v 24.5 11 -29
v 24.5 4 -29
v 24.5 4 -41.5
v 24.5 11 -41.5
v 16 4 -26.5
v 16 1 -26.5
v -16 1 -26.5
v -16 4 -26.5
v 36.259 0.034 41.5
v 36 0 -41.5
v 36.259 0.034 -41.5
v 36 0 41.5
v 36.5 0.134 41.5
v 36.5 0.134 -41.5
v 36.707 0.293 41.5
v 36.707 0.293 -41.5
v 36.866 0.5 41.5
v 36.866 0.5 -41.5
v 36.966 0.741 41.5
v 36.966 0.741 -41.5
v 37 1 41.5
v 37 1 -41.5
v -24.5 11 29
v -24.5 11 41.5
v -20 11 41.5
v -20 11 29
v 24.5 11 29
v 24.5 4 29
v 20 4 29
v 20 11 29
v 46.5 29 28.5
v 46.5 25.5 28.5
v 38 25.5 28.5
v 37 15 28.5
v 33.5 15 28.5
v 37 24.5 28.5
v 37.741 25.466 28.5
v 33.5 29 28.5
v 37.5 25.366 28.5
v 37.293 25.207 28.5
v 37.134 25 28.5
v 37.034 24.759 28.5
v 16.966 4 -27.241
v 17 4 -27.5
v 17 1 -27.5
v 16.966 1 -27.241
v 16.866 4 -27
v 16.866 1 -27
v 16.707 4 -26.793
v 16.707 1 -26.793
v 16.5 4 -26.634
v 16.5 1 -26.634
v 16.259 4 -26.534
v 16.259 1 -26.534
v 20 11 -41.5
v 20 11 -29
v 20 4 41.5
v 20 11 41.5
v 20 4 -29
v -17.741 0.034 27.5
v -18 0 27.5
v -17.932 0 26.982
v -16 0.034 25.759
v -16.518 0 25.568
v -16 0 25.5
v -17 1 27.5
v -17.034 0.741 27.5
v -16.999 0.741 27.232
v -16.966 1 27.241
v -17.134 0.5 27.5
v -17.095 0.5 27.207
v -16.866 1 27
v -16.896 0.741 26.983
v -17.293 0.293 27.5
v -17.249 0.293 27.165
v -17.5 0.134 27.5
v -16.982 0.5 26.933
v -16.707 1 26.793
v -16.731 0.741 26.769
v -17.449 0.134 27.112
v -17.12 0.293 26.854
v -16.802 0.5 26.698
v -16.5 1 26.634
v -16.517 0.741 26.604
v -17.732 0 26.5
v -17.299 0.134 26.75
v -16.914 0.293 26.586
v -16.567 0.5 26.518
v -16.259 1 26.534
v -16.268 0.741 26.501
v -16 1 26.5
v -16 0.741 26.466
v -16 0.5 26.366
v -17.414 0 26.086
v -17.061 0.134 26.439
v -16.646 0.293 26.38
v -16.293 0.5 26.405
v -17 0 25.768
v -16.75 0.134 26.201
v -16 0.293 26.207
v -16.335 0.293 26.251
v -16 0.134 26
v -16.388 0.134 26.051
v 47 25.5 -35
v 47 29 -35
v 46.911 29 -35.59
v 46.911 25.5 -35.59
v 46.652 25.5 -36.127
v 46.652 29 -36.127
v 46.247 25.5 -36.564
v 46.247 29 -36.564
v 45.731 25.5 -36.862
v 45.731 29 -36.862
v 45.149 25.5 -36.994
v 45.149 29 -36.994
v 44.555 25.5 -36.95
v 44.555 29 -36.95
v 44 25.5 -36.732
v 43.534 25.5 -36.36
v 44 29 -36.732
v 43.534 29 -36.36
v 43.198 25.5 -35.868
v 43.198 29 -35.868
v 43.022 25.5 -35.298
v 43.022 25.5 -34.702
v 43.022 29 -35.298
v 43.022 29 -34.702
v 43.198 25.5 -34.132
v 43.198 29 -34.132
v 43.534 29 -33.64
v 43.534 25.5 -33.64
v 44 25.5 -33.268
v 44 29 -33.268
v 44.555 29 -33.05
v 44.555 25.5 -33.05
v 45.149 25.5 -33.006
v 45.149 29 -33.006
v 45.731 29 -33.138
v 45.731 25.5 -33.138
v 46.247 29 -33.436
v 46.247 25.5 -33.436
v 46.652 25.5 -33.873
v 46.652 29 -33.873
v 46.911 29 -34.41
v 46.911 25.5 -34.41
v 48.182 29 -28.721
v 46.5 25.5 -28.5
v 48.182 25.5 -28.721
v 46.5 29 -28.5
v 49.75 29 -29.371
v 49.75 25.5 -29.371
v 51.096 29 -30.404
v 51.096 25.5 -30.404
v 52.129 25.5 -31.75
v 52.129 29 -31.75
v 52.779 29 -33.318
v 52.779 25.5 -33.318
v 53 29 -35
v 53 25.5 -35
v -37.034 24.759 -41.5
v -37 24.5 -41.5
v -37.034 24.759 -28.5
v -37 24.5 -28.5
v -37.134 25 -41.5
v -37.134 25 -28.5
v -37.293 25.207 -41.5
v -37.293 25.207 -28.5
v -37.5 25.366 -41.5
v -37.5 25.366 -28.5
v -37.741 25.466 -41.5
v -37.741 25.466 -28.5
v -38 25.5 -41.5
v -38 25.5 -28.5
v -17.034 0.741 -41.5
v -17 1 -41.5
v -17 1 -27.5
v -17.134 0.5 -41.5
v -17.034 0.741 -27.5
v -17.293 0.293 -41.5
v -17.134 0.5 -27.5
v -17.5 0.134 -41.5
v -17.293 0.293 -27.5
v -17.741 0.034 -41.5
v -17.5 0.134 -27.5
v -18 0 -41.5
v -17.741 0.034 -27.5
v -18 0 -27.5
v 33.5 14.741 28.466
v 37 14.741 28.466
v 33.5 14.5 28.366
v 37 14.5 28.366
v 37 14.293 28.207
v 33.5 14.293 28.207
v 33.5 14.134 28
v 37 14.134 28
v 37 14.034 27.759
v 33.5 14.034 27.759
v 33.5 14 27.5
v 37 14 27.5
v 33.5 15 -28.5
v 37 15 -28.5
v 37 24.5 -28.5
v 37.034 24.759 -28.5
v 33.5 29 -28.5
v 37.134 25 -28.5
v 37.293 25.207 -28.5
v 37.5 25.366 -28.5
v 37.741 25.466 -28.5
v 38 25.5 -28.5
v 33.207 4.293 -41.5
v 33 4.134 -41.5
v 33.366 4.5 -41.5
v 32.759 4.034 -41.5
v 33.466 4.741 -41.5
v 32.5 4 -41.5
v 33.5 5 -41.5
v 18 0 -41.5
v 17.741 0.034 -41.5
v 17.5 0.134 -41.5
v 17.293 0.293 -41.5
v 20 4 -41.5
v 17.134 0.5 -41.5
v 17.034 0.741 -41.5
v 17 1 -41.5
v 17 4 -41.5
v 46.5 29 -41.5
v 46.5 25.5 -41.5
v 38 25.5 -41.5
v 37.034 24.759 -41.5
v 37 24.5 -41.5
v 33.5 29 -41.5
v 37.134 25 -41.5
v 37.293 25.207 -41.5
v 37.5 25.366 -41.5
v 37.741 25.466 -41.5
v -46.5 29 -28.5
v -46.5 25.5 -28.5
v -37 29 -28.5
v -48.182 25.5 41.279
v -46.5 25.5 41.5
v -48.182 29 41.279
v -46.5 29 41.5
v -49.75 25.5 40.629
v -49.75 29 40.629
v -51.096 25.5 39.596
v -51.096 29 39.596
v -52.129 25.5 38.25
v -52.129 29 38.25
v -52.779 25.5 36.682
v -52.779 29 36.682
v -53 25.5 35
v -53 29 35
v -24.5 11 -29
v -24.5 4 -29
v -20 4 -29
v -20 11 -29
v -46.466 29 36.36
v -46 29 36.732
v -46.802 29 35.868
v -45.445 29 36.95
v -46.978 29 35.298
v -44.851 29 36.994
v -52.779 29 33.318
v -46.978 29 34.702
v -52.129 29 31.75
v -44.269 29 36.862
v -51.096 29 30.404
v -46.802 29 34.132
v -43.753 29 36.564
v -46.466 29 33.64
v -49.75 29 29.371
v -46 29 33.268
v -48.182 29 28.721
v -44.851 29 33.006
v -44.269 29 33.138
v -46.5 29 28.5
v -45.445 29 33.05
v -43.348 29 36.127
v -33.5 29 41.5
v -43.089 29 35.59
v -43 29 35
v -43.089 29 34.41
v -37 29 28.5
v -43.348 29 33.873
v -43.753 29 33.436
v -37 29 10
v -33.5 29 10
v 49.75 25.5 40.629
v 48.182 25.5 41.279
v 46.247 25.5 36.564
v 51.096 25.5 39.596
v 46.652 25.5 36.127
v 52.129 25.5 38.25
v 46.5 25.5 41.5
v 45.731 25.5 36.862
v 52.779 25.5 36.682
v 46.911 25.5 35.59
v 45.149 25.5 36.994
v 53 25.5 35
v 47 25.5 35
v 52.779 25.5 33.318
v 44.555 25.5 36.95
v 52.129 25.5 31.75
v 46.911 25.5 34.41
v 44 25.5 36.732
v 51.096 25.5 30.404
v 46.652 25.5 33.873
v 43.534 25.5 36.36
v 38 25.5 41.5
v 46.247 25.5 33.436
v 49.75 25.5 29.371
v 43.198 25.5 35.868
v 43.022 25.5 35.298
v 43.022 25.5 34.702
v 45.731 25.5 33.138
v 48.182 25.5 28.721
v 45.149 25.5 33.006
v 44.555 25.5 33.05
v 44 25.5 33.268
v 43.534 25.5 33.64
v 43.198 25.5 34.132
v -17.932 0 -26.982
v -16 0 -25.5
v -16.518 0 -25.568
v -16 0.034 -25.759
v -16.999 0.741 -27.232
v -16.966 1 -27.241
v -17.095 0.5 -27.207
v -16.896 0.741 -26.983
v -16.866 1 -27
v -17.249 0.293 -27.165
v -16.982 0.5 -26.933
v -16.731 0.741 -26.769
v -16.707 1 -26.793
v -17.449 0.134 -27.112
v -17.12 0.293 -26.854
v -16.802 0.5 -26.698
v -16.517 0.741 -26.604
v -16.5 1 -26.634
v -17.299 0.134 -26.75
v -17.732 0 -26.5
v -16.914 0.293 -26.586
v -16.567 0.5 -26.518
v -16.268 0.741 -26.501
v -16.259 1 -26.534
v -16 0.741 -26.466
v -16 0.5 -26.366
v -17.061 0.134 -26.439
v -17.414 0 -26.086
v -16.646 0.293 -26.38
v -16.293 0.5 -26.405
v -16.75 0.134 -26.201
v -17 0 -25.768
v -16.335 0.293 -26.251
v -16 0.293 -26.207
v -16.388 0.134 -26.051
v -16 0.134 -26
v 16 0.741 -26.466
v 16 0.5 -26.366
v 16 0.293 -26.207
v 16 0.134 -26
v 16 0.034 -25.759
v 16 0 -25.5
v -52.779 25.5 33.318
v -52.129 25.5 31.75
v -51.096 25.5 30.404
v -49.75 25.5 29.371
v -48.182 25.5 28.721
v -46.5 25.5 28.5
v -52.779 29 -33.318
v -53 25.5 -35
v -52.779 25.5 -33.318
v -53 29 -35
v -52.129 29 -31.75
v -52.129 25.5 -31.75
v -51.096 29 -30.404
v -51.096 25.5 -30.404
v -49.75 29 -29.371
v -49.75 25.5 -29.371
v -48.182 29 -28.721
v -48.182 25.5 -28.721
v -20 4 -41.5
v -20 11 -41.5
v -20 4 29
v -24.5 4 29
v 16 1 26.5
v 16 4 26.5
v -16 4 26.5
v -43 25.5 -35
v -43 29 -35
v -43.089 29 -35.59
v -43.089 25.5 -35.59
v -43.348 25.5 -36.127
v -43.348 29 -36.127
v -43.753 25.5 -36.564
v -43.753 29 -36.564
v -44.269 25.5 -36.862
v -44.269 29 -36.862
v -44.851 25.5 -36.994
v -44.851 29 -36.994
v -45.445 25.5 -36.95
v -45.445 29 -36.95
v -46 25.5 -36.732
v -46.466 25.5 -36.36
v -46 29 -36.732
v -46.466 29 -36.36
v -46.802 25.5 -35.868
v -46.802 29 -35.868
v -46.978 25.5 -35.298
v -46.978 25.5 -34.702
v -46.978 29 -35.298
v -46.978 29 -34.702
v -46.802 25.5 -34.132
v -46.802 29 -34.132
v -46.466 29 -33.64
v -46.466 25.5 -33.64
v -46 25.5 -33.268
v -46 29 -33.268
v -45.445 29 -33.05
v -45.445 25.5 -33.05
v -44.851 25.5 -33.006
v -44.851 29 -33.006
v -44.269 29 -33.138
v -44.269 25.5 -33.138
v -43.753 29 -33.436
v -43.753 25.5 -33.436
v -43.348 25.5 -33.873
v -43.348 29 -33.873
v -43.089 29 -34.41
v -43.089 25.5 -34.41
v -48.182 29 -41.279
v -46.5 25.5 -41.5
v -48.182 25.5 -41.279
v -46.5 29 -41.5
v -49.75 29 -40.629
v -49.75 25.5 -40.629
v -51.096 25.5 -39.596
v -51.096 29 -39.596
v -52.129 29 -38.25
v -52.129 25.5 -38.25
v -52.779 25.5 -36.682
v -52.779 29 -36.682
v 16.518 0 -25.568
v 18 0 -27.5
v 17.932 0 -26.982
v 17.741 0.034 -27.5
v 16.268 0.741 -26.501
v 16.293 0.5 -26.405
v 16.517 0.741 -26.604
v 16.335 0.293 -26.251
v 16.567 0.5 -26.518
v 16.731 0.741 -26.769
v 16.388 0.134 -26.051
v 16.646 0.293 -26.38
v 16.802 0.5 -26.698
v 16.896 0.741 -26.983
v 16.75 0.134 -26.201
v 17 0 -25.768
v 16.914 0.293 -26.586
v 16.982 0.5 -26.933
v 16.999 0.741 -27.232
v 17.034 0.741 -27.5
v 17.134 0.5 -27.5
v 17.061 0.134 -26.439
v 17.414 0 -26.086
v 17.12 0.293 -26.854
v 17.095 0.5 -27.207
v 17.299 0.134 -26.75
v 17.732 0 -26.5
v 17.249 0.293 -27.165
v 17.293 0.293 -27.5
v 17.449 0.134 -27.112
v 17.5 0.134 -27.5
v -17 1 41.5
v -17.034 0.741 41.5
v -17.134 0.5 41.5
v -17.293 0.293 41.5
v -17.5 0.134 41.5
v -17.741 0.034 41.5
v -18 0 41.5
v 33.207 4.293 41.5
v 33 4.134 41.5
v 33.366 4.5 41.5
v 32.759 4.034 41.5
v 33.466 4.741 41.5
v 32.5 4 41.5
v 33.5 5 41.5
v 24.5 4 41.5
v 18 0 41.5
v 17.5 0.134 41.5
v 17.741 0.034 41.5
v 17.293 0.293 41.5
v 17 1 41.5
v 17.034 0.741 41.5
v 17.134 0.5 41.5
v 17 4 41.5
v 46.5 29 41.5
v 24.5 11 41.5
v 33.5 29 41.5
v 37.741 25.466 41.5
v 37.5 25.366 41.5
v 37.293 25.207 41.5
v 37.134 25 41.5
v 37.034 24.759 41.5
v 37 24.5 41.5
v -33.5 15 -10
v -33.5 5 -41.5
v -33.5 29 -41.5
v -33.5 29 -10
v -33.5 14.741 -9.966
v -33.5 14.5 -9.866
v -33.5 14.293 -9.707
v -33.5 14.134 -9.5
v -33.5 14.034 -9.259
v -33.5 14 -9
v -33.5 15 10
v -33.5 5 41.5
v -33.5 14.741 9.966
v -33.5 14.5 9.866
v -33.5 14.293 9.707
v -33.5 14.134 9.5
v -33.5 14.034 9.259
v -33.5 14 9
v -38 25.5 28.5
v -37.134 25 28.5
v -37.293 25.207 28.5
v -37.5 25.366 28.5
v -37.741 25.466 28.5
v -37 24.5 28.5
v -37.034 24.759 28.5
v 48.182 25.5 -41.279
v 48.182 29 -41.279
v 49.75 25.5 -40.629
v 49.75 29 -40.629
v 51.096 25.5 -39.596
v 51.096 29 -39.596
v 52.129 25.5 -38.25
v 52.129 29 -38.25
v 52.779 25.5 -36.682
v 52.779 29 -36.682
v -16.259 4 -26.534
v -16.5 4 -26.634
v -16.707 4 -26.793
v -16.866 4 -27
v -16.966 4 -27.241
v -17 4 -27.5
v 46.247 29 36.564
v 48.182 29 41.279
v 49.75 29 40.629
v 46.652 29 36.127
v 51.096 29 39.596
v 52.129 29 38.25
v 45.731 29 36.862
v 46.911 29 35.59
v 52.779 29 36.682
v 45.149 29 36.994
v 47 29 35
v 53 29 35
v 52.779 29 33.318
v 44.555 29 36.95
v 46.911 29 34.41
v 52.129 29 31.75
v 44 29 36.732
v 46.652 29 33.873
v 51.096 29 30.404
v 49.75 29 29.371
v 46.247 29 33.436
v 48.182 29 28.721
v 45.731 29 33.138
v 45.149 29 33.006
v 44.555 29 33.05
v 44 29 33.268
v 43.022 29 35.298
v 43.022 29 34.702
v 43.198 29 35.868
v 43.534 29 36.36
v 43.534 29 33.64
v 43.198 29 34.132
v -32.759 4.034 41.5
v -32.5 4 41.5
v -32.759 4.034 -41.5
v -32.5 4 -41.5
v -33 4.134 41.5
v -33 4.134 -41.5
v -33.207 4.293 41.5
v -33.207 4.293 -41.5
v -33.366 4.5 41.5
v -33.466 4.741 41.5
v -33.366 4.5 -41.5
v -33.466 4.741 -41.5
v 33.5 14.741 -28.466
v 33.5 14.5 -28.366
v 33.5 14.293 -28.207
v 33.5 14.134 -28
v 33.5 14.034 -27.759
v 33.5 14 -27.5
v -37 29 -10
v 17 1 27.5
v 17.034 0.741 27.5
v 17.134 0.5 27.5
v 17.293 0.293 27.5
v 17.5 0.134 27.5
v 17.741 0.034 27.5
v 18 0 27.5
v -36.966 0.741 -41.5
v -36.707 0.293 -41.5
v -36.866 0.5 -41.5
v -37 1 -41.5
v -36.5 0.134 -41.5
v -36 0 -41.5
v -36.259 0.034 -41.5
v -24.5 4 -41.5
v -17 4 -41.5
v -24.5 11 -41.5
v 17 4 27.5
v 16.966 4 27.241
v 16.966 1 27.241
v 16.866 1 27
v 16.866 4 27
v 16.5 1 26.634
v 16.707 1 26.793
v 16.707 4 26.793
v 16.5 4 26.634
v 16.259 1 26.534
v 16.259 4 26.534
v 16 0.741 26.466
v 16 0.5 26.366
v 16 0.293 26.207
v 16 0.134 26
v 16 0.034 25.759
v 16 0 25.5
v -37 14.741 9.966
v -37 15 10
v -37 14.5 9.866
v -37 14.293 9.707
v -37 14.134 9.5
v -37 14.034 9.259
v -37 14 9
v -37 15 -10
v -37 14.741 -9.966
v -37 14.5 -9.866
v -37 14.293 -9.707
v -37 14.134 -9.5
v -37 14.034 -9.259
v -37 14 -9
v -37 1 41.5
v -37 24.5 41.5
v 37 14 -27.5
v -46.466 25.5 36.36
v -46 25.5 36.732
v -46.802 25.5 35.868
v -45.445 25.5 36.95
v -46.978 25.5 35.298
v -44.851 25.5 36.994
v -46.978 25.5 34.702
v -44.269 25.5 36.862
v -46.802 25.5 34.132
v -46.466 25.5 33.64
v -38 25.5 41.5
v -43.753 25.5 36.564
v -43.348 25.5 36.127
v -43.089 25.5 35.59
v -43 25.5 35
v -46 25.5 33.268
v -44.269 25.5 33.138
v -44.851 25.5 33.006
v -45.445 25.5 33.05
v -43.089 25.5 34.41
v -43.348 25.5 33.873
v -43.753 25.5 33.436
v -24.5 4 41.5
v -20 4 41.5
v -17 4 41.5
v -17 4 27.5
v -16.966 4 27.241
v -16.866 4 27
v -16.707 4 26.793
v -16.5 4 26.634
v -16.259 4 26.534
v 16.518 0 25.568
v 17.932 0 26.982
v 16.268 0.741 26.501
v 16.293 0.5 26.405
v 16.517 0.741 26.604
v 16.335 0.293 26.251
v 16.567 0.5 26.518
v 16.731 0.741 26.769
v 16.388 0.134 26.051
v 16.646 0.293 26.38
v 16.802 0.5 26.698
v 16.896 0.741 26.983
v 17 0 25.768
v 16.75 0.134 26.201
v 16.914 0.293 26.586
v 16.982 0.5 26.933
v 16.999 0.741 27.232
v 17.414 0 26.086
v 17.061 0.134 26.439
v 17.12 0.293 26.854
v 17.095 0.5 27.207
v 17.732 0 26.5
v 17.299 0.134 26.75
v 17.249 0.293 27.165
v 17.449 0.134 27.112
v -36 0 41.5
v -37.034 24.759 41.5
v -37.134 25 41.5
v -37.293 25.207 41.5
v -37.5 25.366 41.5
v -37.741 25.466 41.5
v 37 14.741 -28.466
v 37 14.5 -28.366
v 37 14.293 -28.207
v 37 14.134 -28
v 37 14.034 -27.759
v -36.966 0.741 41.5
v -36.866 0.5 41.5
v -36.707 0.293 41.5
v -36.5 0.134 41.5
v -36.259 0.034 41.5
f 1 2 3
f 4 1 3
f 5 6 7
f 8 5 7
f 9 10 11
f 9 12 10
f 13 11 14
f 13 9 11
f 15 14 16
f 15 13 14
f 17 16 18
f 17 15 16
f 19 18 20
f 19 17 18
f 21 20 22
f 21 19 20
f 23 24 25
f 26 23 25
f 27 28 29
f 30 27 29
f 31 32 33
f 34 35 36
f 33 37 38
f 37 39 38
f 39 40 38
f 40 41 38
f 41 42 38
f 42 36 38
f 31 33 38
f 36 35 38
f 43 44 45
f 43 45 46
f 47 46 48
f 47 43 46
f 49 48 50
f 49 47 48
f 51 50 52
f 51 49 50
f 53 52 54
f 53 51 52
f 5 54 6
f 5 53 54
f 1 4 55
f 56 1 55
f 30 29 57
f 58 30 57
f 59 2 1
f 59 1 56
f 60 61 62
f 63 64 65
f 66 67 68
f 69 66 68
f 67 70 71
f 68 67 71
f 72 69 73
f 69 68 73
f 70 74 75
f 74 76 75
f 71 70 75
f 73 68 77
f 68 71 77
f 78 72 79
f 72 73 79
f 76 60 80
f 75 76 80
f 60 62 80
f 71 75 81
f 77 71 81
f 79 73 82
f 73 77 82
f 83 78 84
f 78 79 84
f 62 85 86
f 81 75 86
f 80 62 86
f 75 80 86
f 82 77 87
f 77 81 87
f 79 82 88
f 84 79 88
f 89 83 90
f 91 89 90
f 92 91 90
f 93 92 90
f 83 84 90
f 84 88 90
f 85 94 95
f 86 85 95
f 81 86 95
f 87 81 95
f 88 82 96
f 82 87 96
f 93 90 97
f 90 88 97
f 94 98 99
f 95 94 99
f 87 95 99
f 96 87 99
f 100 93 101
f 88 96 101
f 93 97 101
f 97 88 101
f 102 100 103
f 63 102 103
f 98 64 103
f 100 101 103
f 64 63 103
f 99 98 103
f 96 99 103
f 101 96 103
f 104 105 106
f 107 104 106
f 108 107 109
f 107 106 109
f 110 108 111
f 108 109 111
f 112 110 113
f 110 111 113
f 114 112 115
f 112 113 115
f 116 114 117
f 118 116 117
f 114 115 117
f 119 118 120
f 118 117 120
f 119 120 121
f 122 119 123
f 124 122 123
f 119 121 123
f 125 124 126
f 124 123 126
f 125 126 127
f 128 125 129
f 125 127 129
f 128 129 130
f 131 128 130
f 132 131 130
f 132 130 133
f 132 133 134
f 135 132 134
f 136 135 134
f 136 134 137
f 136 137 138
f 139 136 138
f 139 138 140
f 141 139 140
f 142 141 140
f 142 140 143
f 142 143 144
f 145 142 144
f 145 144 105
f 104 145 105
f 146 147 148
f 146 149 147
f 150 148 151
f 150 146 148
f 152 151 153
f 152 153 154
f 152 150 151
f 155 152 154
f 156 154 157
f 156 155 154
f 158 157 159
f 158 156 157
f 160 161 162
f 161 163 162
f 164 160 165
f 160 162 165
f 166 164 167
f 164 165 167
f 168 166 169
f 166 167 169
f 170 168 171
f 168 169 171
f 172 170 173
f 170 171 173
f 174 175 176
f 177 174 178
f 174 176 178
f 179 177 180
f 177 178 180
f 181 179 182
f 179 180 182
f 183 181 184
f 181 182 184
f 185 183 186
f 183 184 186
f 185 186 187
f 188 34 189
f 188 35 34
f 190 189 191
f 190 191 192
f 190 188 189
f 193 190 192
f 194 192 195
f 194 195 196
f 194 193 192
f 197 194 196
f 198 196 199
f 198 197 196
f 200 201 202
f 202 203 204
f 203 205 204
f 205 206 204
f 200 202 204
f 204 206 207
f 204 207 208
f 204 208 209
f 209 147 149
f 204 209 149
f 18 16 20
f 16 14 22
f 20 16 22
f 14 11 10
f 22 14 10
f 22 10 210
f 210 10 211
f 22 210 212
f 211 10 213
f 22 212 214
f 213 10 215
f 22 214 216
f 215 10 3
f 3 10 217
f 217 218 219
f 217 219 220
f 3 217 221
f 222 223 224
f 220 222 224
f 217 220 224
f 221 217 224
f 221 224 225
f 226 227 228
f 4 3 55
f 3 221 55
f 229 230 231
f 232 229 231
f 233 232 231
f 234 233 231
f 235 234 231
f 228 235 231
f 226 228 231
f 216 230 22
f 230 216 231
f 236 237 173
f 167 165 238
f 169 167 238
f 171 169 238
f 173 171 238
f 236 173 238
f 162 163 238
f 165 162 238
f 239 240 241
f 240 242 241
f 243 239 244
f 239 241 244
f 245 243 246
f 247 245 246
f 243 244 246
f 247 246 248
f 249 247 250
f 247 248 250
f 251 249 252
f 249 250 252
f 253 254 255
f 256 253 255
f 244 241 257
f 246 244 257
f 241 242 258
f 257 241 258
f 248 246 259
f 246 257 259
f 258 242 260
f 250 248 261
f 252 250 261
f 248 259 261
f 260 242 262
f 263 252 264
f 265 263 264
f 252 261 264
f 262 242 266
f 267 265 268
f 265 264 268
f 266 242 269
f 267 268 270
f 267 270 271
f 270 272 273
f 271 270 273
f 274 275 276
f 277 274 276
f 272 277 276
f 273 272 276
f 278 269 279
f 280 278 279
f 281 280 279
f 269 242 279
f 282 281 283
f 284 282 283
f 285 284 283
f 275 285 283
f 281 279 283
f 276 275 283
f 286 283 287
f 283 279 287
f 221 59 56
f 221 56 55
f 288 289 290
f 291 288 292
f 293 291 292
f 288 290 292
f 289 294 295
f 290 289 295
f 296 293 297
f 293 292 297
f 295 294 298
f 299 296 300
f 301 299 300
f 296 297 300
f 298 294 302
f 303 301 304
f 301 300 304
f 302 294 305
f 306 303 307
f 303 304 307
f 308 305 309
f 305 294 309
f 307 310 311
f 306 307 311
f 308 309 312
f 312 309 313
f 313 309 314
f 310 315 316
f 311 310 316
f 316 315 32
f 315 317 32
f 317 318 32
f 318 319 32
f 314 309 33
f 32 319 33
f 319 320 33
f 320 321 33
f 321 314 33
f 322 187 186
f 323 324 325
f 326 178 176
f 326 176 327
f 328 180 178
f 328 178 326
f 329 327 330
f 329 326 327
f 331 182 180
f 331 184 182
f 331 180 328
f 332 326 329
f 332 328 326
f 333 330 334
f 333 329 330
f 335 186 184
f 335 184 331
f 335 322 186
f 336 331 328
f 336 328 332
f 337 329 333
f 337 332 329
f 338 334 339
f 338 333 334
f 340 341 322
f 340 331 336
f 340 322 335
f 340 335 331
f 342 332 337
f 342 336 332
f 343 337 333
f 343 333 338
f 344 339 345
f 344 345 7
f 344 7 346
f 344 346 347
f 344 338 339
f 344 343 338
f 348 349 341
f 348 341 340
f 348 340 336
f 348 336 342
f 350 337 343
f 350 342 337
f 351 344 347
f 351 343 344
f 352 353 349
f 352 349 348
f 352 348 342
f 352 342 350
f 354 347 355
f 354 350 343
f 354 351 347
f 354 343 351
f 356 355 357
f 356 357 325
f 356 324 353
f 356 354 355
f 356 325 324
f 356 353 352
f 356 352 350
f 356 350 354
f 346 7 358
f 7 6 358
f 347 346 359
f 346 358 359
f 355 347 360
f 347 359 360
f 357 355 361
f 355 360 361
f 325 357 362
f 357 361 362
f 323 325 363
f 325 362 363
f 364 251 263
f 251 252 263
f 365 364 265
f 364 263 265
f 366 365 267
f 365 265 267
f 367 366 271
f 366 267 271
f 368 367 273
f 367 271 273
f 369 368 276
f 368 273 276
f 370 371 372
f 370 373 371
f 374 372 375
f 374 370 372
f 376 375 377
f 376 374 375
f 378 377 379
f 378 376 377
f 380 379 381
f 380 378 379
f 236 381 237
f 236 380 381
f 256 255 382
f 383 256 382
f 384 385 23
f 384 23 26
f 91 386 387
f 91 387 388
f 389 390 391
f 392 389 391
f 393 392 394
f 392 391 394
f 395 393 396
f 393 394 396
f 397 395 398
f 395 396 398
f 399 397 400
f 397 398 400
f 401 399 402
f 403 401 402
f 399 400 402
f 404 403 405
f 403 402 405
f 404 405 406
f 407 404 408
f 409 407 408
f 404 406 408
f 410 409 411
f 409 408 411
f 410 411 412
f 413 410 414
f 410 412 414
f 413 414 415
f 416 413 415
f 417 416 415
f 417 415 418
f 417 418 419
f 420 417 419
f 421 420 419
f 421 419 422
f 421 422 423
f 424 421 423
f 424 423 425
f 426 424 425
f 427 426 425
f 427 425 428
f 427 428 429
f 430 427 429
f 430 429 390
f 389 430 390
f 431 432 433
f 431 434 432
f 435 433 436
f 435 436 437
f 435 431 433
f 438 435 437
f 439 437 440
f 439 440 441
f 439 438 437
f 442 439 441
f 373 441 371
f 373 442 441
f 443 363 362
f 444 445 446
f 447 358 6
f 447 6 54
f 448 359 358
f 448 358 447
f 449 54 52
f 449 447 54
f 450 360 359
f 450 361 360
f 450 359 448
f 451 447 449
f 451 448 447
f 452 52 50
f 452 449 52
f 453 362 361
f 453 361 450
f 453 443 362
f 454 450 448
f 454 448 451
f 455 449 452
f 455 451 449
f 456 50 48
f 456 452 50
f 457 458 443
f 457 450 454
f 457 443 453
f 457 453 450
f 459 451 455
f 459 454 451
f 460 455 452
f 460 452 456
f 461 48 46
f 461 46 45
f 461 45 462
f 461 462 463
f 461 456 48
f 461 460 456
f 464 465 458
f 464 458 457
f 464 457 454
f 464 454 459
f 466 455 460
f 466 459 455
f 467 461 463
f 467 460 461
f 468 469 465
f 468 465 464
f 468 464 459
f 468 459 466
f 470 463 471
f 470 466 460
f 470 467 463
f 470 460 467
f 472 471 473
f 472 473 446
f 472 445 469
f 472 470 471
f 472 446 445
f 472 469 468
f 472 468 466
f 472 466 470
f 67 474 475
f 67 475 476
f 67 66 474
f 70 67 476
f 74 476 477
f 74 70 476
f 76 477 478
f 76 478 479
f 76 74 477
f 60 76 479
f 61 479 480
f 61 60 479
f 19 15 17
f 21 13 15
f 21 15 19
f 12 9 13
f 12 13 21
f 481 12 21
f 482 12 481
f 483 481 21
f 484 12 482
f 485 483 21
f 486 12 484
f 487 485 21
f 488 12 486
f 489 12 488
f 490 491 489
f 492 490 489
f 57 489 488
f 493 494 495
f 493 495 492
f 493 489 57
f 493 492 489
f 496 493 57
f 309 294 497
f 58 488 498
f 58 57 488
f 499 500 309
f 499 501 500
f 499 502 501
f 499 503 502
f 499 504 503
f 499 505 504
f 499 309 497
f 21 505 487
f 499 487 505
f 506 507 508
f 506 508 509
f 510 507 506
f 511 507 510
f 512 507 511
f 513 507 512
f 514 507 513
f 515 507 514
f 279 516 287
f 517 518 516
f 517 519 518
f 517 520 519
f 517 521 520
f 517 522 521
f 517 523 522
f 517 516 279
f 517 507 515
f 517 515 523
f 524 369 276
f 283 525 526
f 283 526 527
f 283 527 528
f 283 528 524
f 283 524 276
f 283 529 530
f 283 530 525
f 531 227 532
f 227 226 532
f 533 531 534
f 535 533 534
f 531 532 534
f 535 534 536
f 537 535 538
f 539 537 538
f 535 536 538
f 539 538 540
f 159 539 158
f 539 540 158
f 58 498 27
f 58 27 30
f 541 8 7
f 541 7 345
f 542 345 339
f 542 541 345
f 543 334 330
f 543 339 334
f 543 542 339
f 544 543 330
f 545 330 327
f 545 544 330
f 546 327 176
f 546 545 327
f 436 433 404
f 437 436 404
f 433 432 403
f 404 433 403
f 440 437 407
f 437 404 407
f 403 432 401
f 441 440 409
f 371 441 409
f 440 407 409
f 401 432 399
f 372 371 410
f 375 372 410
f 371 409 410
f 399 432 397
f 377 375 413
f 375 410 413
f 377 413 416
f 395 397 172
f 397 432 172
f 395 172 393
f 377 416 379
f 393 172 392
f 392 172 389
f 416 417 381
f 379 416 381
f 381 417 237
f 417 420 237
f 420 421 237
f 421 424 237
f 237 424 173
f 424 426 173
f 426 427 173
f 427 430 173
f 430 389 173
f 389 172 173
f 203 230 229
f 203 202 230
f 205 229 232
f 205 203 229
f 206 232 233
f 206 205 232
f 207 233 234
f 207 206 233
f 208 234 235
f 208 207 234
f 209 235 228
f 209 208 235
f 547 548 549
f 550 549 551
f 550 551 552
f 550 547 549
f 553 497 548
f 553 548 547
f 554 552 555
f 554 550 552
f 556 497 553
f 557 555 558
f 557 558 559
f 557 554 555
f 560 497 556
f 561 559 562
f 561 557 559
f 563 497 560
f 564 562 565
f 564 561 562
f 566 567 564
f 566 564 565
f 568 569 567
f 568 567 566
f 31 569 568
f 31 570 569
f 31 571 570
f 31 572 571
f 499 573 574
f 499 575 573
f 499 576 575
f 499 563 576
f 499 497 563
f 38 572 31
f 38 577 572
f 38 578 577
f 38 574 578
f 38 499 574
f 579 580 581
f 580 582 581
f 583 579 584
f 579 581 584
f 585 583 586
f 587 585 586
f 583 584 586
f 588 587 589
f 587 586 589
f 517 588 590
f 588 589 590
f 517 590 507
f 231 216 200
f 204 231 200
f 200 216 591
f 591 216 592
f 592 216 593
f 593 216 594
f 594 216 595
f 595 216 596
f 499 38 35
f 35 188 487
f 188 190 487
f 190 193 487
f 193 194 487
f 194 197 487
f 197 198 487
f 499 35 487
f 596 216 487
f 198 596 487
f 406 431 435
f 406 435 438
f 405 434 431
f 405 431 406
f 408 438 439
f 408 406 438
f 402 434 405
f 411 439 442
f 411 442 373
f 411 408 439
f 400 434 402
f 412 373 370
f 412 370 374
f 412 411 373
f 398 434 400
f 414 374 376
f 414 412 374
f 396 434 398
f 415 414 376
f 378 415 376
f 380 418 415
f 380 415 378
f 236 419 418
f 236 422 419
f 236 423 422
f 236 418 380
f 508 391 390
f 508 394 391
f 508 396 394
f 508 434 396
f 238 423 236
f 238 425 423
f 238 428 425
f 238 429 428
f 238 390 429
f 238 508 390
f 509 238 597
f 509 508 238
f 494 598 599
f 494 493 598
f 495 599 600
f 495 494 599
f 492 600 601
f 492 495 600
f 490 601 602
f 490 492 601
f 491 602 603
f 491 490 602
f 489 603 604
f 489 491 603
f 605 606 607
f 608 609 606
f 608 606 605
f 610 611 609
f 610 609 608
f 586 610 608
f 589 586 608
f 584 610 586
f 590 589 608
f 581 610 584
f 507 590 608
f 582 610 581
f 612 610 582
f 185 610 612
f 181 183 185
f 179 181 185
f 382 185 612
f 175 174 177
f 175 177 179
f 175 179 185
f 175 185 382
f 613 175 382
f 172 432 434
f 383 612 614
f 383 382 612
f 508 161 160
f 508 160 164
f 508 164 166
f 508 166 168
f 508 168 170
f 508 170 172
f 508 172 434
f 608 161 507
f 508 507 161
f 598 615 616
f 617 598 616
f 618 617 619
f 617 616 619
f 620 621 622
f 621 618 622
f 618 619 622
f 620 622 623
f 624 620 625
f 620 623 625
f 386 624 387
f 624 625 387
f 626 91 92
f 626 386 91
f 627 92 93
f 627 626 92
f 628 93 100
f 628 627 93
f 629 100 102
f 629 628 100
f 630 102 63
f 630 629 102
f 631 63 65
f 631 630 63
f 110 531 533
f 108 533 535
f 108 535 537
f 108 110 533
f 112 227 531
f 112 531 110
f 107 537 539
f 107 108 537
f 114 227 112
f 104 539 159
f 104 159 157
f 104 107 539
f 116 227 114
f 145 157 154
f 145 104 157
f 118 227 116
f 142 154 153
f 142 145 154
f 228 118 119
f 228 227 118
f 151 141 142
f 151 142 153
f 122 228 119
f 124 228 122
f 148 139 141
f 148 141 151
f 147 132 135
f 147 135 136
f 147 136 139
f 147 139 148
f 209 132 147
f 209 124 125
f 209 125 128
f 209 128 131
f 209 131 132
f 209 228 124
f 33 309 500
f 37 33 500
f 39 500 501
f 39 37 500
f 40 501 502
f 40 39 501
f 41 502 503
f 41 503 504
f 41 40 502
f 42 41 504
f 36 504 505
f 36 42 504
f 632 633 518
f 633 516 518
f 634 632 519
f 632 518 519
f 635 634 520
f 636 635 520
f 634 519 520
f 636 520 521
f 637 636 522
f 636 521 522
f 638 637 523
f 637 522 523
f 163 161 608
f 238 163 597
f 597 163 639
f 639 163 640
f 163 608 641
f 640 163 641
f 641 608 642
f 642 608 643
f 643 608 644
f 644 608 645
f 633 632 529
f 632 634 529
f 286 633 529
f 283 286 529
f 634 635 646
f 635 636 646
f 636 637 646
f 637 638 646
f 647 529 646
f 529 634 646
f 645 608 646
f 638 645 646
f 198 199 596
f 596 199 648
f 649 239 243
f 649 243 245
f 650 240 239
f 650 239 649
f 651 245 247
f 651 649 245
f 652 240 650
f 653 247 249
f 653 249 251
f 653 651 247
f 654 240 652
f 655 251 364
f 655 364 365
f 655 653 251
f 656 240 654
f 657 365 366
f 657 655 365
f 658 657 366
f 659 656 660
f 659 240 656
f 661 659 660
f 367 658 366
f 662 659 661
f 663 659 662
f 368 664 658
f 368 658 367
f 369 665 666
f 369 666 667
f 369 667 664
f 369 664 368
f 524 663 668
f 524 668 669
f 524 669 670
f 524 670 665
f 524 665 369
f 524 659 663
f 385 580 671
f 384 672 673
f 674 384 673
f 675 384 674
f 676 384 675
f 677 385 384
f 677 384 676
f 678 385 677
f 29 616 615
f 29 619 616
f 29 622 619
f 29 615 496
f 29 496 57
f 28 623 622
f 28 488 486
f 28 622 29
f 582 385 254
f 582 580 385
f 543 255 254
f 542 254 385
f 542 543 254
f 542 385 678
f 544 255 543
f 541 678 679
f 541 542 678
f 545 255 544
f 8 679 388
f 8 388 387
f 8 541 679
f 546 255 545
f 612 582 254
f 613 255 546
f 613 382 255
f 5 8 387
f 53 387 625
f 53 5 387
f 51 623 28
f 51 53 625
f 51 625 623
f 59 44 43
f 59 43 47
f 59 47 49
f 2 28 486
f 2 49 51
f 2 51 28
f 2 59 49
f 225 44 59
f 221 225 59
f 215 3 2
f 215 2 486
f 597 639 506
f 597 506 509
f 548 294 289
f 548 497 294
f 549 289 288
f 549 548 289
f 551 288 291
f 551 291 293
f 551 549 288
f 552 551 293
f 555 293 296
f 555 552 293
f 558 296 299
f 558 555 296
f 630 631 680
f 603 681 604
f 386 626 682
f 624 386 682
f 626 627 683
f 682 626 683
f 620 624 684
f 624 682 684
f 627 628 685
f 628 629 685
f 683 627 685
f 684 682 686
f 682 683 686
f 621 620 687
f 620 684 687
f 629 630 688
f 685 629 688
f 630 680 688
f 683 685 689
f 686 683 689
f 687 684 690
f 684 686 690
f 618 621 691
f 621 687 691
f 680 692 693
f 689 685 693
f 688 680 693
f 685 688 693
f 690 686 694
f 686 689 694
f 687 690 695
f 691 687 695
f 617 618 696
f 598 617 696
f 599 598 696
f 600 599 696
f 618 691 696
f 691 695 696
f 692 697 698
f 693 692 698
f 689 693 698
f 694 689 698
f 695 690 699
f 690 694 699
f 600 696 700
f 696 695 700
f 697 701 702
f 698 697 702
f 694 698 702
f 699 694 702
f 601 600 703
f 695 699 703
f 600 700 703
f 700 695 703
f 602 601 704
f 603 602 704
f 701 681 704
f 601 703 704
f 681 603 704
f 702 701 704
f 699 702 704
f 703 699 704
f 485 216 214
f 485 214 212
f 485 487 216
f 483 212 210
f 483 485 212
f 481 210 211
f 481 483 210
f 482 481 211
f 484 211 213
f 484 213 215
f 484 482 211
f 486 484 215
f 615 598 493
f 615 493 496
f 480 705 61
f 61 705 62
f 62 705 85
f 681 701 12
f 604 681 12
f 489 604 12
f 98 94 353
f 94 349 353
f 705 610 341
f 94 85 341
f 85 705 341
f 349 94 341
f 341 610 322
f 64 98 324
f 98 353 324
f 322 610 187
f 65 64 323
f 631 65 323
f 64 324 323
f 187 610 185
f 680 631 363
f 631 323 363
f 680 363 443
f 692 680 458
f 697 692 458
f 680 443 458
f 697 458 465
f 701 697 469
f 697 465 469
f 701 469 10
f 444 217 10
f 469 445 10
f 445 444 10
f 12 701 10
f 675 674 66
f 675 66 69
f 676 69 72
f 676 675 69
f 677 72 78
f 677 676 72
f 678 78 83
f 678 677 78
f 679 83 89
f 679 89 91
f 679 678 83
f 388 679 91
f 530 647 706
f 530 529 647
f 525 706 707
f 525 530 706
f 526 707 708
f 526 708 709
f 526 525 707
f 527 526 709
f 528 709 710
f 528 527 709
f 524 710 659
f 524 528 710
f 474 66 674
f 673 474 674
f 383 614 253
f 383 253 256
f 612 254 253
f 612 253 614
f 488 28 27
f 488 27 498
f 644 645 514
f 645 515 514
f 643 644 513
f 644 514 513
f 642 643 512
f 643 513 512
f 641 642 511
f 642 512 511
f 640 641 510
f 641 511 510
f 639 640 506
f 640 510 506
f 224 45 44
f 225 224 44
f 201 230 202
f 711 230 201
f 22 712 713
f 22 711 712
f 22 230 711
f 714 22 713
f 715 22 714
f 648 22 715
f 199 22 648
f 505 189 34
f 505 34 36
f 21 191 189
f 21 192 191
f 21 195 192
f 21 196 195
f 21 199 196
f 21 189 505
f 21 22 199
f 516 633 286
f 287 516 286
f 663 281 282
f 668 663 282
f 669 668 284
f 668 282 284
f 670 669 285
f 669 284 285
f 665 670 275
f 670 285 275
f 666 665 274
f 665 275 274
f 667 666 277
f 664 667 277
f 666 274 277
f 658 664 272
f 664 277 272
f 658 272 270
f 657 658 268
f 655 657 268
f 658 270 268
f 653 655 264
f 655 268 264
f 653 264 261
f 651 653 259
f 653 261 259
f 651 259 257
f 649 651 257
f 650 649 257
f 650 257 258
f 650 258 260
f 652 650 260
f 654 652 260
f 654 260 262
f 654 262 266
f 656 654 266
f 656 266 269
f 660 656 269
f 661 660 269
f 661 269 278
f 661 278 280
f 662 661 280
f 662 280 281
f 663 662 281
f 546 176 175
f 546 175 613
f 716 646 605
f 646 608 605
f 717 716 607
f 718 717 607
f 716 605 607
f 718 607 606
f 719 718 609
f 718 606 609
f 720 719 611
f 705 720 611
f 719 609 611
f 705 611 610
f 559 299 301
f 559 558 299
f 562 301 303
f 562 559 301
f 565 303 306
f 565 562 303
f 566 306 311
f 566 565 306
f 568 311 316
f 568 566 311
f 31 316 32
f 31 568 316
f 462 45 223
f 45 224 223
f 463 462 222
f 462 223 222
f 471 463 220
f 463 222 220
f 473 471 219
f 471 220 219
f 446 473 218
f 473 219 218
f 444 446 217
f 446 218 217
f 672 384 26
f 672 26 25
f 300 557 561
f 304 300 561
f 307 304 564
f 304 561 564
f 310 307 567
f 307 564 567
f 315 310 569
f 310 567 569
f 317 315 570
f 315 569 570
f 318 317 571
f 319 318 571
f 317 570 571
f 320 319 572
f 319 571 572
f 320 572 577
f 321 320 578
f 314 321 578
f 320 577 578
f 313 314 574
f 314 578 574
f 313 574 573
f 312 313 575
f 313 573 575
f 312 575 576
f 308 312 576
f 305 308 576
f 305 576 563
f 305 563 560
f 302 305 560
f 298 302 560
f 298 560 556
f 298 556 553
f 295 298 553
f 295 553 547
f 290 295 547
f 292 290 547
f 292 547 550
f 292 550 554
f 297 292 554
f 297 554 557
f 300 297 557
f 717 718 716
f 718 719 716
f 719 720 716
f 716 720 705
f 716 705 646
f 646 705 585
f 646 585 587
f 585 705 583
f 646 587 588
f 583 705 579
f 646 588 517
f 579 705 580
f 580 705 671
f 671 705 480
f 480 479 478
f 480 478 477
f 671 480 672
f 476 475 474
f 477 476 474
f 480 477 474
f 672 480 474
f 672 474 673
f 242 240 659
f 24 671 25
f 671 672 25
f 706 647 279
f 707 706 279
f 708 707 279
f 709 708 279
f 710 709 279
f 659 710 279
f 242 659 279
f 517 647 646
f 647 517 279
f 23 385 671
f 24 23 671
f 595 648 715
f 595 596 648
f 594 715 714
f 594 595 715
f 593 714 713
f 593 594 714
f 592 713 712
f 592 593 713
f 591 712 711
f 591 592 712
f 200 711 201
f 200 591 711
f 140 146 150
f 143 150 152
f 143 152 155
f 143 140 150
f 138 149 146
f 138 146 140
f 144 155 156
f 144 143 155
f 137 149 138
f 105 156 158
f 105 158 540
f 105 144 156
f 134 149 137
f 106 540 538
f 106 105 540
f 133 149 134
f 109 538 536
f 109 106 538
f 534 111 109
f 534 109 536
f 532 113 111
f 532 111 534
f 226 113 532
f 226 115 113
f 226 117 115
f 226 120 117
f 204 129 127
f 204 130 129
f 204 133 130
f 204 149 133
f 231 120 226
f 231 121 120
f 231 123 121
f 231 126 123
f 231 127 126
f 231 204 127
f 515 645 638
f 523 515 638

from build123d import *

# Parameters (mm, degrees)
SKETCH1_W                       = 74
SKETCH1_H                       = 53
BOSS_EXTRUDE1_DEPTH             = 4
SKETCH2_W                       = 3.5
SKETCH2_H                       = 53
BOSS_EXTRUDE2_DEPTH             = 25
CUT_EXTRUDE1_REACH              = 85.781
SKETCH3_W                       = 20
SKETCH3_H                       = 15
SKETCH5_W                       = 20
SKETCH5_H                       = 4
BOSS_EXTRUDE4_DEPTH             = 15
MIRROR4_COPY_1_SKETCH_W         = 20
MIRROR4_COPY_1_SKETCH_H         = 4
MIRROR4_COPY_1_DEPTH            = 15
SKETCH6_W                       = 3.5
SKETCH6_H                       = 15
BOSS_EXTRUDE5_DEPTH             = 25
MIRROR6_COPY_1_SKETCH_W         = 3.5
MIRROR6_COPY_1_SKETCH_H         = 15
MIRROR6_COPY_1_DEPTH            = 25
MIRROR6_COPY_2_SKETCH_W         = 3.5
MIRROR6_COPY_2_SKETCH_H         = 15
MIRROR6_COPY_2_DEPTH            = 25
SKETCH7_W                       = 4.5
SKETCH7_H                       = 12.5
BOSS_EXTRUDE6_DEPTH             = 7
MIRROR8_COPY_1_SKETCH_W         = 4.5
MIRROR8_COPY_1_SKETCH_H         = 12.5
MIRROR8_COPY_1_DEPTH            = 7
SKETCH8_W                       = 13
SKETCH8_H                       = 3.5
BOSS_EXTRUDE7_DEPTH             = 16
MIRROR10_COPY_1_SKETCH_W        = 13
MIRROR10_COPY_1_SKETCH_H        = 3.5
MIRROR10_COPY_1_DEPTH           = 16
CUT_EXTRUDE2_REACH              = 105.263
SKETCH9_W                       = 57
SKETCH9_H                       = 15
F_4_0MM_CLEARANCE_DOWEL_HOLE1_D = 4
FILLET1_R                       = 6.5
FILLET2_R                       = 1
FILLET3_R                       = 1


with BuildPart() as part:
    # Sketch1 → Boss-Extrude1 (new body)
    with BuildSketch(Plane(origin=(0, 0, 0), x_dir=(1, 0, 0), z_dir=(0, 1, 0))):
        Rectangle(SKETCH1_W, SKETCH1_H)
    extrude(amount=BOSS_EXTRUDE1_DEPTH)

    # Sketch2 → Boss-Extrude2 (add)
    with BuildSketch(Plane(origin=(0, 4, 0), x_dir=(1, 0, 0), z_dir=(0, 1, 0))):
        with Locations((-35.25, 0)):
            Rectangle(SKETCH2_W, SKETCH2_H)
    boss_extrude2 = extrude(amount=BOSS_EXTRUDE2_DEPTH)

    # Mirror1: Boss-Extrude2 across plane
    add(boss_extrude2.mirror(Plane(origin=(0, 0, 0), x_dir=(0, 0, 1), z_dir=(1, 0, 0))))

    # Sketch3 → Cut-Extrude1 (cut, up to next)
    with BuildSketch(Plane.ZY.offset(37), mode=Mode.PRIVATE) as cut_extrude1_sk1:
        with Locations((0, 21.5)):
            Rectangle(SKETCH3_W, SKETCH3_H)
    cut_extrude1_tool1 = extrude(cut_extrude1_sk1.sketch, amount=-CUT_EXTRUDE1_REACH, mode=Mode.PRIVATE) & part.part
    add(cut_extrude1_tool1.solids().sort_by_distance((-37, 21.5, 0))[0], mode=Mode.SUBTRACT)

    # Sketch5 → Boss-Extrude4 (add)
    with BuildSketch(Plane(origin=(0, 0, -26.5), x_dir=(-1, 0, 0), z_dir=(0, 0, -1))):
        with Locations((27, 2)):
            Rectangle(SKETCH5_W, SKETCH5_H)
    boss_extrude4 = extrude(amount=BOSS_EXTRUDE4_DEPTH)

    # Mirror3: Boss-Extrude4 across plane
    add(boss_extrude4.mirror(Plane.XY))

    # Mirror4: Boss-Extrude4 across plane
    add(boss_extrude4.mirror(Plane(origin=(0, 0, 0), x_dir=(0, 0, 1), z_dir=(1, 0, 0))))

    # Mirror4 copy 1 sketch → Mirror4 copy 1 (add)
    with BuildSketch(Plane.XY.offset(26.5)):
        with Locations((27, 2)):
            Rectangle(MIRROR4_COPY_1_SKETCH_W, MIRROR4_COPY_1_SKETCH_H)
    extrude(amount=MIRROR4_COPY_1_DEPTH)

    # Sketch6 → Boss-Extrude5 (add)
    with BuildSketch(Plane(origin=(0, 4, 0), x_dir=(1, 0, 0), z_dir=(0, 1, 0))):
        with Locations((-35.25, 34)):
            Rectangle(SKETCH6_W, SKETCH6_H)
    boss_extrude5 = extrude(amount=BOSS_EXTRUDE5_DEPTH)

    # Mirror5: Boss-Extrude5 across plane
    add(boss_extrude5.mirror(Plane.XY))

    # Mirror6 copy 1 sketch → Mirror6 copy 1 (add)
    with BuildSketch(Plane(origin=(0, 4, 0), x_dir=(-1, 0, 0), z_dir=(0, 1, 0))):
        with Locations((-35.25, 34)):
            Rectangle(MIRROR6_COPY_1_SKETCH_W, MIRROR6_COPY_1_SKETCH_H)
    extrude(amount=MIRROR6_COPY_1_DEPTH)

    # Mirror6 copy 2 sketch → Mirror6 copy 2 (add)
    with BuildSketch(Plane(origin=(0, 4, 0), x_dir=(-1, 0, 0), z_dir=(0, 1, 0))):
        with Locations((-35.25, -34)):
            Rectangle(MIRROR6_COPY_2_SKETCH_W, MIRROR6_COPY_2_SKETCH_H)
    extrude(amount=MIRROR6_COPY_2_DEPTH)

    # Sketch7 → Boss-Extrude6 (add)
    with BuildSketch(Plane(origin=(0, 4, 0), x_dir=(1, 0, 0), z_dir=(0, 1, 0))):
        with Locations((-22.25, 35.25)):
            Rectangle(SKETCH7_W, SKETCH7_H)
    boss_extrude6 = extrude(amount=BOSS_EXTRUDE6_DEPTH)

    # Mirror7: Boss-Extrude6 across plane
    add(boss_extrude6.mirror(Plane.XY))

    # Mirror8: Boss-Extrude6 across plane
    add(boss_extrude6.mirror(Plane(origin=(0, 0, 0), x_dir=(0, 0, 1), z_dir=(1, 0, 0))))

    # Mirror8 copy 1 sketch → Mirror8 copy 1 (add)
    with BuildSketch(Plane(origin=(0, 4, 0), x_dir=(-1, 0, 0), z_dir=(0, 1, 0))):
        with Locations((-22.25, 35.25)):
            Rectangle(MIRROR8_COPY_1_SKETCH_W, MIRROR8_COPY_1_SKETCH_H)
    extrude(amount=MIRROR8_COPY_1_DEPTH)

    # Sketch8 → Boss-Extrude7 (add)
    with BuildSketch(Plane.ZY.offset(37)):
        with Locations((-35, 27.25)):
            Rectangle(SKETCH8_W, SKETCH8_H)
    boss_extrude7 = extrude(amount=BOSS_EXTRUDE7_DEPTH)

    # Mirror9: Boss-Extrude7 across plane
    add(boss_extrude7.mirror(Plane.XY))

    # Mirror10: Boss-Extrude7 across plane
    add(boss_extrude7.mirror(Plane(origin=(0, 0, 0), x_dir=(0, 0, 1), z_dir=(1, 0, 0))))

    # Mirror10 copy 1 sketch → Mirror10 copy 1 (add)
    with BuildSketch(Plane(origin=(37, 0, 0), x_dir=(0, 0, -1), z_dir=(1, 0, 0))):
        with Locations((-35, 27.25)):
            Rectangle(MIRROR10_COPY_1_SKETCH_W, MIRROR10_COPY_1_SKETCH_H)
    extrude(amount=MIRROR10_COPY_1_DEPTH)

    # Sketch9 → Cut-Extrude2 (cut, up to next)
    with BuildSketch(Plane(origin=(37, 0, 0), x_dir=(0, 0, -1), z_dir=(1, 0, 0)), mode=Mode.PRIVATE) as cut_extrude2_sk1:
        with Locations((0, 21.5)):
            Rectangle(SKETCH9_W, SKETCH9_H)
    cut_extrude2_tool1 = extrude(cut_extrude2_sk1.sketch, amount=-CUT_EXTRUDE2_REACH, mode=Mode.PRIVATE) & part.part
    add(cut_extrude2_tool1.solids().sort_by_distance((37, 21.5, 0))[0], mode=Mode.SUBTRACT)

    # Ø4.0mm Clearance Dowel Hole1 (through all)
    with Locations(Plane(origin=(0, 25.5, 0), x_dir=(-1, 0, 0), z_dir=(0, -1, 0))):
        with Locations((-45, 35), (-45, -35), (45, 35), (45, -35)):
            Hole(F_4_0MM_CLEARANCE_DOWEL_HOLE1_D / 2)

    # Fillet1
    fillet1_edges = [part.edges().sort_by_distance(p)[0] for p in [
        (-53, 27.25, -41.5),
        (-53, 27.25, -28.5),
        (-53, 27.25, 41.5),
        (-53, 27.25, 28.5),
        (53, 27.25, 41.5),
        (53, 27.25, 28.5),
        (53, 27.25, -41.5),
        (53, 27.25, -28.5),
    ]]
    fillet(fillet1_edges, radius=FILLET1_R - 0.0001)  # a hair under: the kernel refuses the full size

    # Fillet2
    fillet2_edges = [part.edges().sort_by_distance(p)[0] for p in [
        (-33.5, 4, 0),
        (-37, 25.5, -35),
        (-37, 25.5, 35),
        (37, 25.5, 35),
        (37, 25.5, -35),
        (35.25, 14, 28.5),
        (35.25, 14, -28.5),
        (33.5, 4, 0),
        (-35.25, 14, -10),
        (-35.25, 14, 10),
        (-17, 2, -26.5),
        (-17, 2, 26.5),
        (17, 2, 26.5),
        (17, 2, -26.5),
    ]]
    fillet(fillet2_edges, radius=FILLET2_R)

    # Fillet3
    fillet3_edges = [part.edges().sort_by_distance(p)[0] for p in [
        (0, 0, -26.5),
        (0, 0, 26.5),
        (16.707106781, 0, -26.792893219),
        (-16.707106781, 0, -26.792893219),
        (-16.707106781, 0, 26.792893219),
        (16.707106781, 0, 26.792893219),
        (-37, 0, 0),
        (37, 0, 0),
        (-17, 0, -34.5),
        (-17, 0, 34.5),
        (17, 0, 34.5),
        (17, 0, -34.5),
    ]]
    fillet(fillet3_edges, radius=FILLET3_R)


solid = part.part
